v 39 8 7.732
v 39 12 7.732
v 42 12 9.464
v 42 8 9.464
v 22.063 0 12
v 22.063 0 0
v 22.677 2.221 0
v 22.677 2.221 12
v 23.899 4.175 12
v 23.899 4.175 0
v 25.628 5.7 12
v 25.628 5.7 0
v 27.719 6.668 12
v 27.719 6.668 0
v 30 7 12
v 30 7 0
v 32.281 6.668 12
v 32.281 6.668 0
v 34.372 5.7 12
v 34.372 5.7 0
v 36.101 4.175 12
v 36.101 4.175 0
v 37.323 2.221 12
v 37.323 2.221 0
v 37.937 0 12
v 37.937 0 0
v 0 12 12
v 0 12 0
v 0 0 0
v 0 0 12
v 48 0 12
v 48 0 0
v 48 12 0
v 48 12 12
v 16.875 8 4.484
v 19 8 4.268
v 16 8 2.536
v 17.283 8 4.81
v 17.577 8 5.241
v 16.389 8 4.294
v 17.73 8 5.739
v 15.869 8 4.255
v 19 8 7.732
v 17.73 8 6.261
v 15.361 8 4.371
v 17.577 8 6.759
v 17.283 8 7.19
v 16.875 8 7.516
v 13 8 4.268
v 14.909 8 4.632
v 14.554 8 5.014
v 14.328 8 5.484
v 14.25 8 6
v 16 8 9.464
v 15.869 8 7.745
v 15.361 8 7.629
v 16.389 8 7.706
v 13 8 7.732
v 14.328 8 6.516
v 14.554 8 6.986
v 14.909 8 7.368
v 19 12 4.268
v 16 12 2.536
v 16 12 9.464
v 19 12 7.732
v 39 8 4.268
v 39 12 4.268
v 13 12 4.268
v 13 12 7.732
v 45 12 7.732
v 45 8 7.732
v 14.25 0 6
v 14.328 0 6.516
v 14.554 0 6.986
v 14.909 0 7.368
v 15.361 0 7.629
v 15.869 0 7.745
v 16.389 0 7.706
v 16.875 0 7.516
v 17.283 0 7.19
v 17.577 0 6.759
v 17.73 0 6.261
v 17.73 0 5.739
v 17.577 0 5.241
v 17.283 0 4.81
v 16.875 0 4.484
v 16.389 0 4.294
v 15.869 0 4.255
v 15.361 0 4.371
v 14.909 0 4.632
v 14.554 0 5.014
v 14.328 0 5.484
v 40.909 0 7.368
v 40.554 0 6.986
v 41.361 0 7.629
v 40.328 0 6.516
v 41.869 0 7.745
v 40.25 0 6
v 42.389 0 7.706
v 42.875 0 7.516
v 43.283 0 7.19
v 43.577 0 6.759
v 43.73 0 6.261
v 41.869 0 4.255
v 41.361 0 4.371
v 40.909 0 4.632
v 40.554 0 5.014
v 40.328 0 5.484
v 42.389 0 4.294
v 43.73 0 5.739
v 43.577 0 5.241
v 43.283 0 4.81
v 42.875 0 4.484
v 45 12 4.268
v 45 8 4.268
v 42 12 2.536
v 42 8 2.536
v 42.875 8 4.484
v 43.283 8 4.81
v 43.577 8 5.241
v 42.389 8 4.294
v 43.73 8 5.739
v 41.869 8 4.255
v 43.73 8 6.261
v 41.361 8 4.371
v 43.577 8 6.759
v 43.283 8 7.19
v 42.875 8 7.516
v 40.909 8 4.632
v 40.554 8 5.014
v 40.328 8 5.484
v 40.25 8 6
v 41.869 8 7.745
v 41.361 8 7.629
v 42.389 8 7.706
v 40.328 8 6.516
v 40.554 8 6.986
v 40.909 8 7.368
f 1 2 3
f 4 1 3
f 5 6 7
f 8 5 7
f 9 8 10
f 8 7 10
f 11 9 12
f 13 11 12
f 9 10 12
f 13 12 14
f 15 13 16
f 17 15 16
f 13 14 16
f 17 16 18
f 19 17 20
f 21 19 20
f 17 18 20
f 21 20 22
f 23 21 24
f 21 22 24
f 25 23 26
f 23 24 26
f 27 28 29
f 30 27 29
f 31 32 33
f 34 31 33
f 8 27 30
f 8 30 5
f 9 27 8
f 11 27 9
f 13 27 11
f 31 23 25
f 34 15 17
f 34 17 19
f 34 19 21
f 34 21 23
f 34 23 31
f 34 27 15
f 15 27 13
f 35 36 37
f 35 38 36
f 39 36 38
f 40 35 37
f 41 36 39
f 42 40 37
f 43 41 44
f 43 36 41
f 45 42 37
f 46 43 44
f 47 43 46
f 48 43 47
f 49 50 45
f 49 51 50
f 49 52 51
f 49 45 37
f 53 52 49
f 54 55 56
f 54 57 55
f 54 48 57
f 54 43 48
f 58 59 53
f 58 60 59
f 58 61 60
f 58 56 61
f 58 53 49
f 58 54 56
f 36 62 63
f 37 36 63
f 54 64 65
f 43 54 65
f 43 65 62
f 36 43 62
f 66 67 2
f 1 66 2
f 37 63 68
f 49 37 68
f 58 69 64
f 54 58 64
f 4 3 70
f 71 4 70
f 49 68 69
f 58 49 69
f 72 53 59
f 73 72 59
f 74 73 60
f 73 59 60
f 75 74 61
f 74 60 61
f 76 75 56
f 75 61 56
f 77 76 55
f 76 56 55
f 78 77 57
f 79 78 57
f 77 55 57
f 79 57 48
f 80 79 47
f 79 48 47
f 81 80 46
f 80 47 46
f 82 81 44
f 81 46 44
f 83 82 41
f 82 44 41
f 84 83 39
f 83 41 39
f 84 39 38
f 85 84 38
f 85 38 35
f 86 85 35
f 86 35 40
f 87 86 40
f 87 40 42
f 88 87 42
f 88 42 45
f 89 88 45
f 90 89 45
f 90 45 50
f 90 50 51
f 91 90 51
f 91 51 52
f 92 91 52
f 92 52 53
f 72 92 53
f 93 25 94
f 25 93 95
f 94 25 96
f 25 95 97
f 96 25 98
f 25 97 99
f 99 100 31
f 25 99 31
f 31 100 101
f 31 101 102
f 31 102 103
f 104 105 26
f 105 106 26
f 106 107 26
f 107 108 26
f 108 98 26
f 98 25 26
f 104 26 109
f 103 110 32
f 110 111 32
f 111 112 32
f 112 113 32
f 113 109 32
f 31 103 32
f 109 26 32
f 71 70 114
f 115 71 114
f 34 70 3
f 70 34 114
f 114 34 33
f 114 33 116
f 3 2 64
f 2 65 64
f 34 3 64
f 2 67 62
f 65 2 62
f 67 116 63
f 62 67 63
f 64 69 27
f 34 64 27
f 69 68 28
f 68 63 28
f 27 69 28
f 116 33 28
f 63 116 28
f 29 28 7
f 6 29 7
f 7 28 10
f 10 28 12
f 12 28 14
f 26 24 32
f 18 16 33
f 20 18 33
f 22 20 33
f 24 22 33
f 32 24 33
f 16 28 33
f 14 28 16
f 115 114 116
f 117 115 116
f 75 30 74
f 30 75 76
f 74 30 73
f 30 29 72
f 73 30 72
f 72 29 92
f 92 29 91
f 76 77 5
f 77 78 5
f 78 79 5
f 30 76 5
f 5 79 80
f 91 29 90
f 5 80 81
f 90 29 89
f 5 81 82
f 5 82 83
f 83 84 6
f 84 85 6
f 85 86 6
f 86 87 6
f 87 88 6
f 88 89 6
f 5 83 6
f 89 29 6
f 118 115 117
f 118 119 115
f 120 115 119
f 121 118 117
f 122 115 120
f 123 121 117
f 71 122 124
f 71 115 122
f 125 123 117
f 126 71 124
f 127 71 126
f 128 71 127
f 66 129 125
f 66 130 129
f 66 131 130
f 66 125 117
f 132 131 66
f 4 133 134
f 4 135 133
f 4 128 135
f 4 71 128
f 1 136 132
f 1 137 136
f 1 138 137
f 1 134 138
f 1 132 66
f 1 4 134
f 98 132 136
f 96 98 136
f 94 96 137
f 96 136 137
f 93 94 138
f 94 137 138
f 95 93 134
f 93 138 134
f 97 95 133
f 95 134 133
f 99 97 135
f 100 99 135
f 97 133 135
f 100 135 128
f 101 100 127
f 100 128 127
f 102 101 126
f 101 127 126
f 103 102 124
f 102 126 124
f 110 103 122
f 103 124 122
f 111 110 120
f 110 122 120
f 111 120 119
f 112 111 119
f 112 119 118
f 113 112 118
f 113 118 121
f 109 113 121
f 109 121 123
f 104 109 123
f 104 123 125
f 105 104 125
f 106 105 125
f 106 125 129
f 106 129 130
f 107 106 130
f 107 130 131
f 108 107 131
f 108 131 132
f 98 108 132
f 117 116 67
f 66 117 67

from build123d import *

# Parameters (mm, degrees)
F1_DEPTH = 12
F2_R     = 1.75
F3_DEPTH = 12
F4_DEPTH = 4


with BuildPart() as f1:
    # F0 (on Top) → F1 (new body)
    with BuildSketch(Plane.XY):
        with BuildLine():
            Line((0, 12), (0, 0))
            Line((0, 0), (22.062746, 0))
            ThreePointArc((22.062746, 0), (30, 7), (37.937254, 0))
            Line((37.937254, 0), (48, 0))
            Line((48, 0), (48, 12))
            Line((48, 12), (0, 12))
        make_face()
    extrude(amount=F1_DEPTH)

    # F2 (on face) → F3 (cut, through all)
    with BuildSketch(Plane(origin=(0, 12, 0), x_dir=(-1, 0, 0), z_dir=(0, 1, 0))):
        with Locations((-42, 6)):
            Circle(F2_R)
        with Locations((-16, 6)):
            Circle(F2_R)
    extrude(amount=-F3_DEPTH, mode=Mode.SUBTRACT)

    # F2 (on face) → F4 (cut)
    with BuildSketch(Plane(origin=(0, 12, 0), x_dir=(-1, 0, 0), z_dir=(0, 1, 0))):
        Polygon((-39, 4.267949), (-39, 7.732051), (-42, 9.464102), (-45, 7.732051), (-45, 4.267949), (-42, 2.535898), align=None)
        with Locations((-42, 6)):
            Circle(F2_R, mode=Mode.SUBTRACT)
        Polygon((-13, 7.732051), (-16, 9.464102), (-19, 7.732051), (-19, 4.267949), (-16, 2.535898), (-13, 4.267949), align=None)
        with Locations((-16, 6)):
            Circle(F2_R, mode=Mode.SUBTRACT)
    extrude(amount=-F4_DEPTH, mode=Mode.SUBTRACT)


solid = f1.part
